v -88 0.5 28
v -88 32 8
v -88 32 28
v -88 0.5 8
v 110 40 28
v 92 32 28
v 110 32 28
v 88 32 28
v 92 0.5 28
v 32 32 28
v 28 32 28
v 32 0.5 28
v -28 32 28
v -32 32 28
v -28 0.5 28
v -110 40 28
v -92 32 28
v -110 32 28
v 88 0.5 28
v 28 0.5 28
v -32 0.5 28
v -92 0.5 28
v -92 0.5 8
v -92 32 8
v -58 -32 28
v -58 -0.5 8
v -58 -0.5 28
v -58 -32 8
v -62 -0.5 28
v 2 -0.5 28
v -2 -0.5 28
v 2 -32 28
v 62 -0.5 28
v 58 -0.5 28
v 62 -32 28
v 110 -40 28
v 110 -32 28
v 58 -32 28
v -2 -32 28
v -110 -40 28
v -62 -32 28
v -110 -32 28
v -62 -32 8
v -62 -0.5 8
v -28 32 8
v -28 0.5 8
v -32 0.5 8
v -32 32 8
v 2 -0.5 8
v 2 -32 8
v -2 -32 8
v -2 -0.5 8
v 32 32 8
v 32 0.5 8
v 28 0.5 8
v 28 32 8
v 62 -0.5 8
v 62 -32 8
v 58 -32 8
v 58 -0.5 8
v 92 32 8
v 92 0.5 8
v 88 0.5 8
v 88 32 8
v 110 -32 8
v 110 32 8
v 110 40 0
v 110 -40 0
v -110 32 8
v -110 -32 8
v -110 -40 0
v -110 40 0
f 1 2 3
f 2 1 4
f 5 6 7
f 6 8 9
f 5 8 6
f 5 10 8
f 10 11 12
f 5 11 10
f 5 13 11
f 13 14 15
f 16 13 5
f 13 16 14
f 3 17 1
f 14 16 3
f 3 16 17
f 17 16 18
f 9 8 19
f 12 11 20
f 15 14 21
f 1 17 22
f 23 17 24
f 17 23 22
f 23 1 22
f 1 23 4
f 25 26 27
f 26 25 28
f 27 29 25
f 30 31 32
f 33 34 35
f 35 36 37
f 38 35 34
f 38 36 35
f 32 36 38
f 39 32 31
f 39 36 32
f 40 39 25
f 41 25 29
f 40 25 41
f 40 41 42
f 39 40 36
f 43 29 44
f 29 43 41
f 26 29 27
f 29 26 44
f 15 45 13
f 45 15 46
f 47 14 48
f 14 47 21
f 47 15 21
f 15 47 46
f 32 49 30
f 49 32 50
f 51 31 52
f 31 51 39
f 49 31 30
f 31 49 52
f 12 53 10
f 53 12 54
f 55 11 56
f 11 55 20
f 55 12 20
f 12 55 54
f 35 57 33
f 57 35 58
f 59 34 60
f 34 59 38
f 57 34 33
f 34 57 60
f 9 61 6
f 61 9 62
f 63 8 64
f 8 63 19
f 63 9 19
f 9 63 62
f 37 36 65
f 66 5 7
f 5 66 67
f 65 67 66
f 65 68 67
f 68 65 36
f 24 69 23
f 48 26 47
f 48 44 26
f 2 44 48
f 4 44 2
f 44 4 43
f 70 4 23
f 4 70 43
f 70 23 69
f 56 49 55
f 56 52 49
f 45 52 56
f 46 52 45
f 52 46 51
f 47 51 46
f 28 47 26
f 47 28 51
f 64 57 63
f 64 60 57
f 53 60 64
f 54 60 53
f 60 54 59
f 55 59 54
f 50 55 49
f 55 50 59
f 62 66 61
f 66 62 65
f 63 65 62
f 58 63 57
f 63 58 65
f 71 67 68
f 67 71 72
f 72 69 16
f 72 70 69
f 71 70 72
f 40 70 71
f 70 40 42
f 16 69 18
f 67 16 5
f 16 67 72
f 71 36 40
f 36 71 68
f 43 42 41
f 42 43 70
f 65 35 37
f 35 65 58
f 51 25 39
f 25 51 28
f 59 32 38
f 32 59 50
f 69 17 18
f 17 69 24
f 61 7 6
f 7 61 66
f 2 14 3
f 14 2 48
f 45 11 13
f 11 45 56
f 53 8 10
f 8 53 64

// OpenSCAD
$fn = 32;

// ----------------------------------------------------------------------
// Rib frame 220 x 80 x 28
// 7 ribs at 30 mm pitch, staggered
// ----------------------------------------------------------------------

// --- parameters (mm) ---
frame = [220, 80, 8];  // base plate size (x, y, z)
rail_w = 8;            // side rail width
ribs = 7;              // number of ribs
rib_t = 4;             // rib thickness
rib_h = 20;            // rib height above the base plate
pitch = 30;            // pitch between rib centres

// --- derived feature positions (mm) ---
span = (ribs - 1) * pitch;          // = 180   distance between the outer ribs
origin_x = -span / 2;               // = -90   X of the first rib
rib_len = frame[1] / 2 - rail_w + 0.5;  // = 32.5   length of a staggered rib
rib_y = 0.5 + rib_len / 2;          // = 16.75   Y of a staggered rib centre
row_offset = 2 * rib_y;             // = 33.5   distance between the two rows
feature_centers = [
  [origin_x + 0 * pitch, rib_y],
  [origin_x + 1 * pitch, -rib_y],
  [origin_x + 2 * pitch, rib_y],
  [origin_x + 3 * pitch, -rib_y],
  [origin_x + 4 * pitch, rib_y],
  [origin_x + 5 * pitch, -rib_y],
  [origin_x + 6 * pitch, rib_y]
];   // rib centre line, drives the rib loop

// base plate, two side rails, then the ribs read straight off feature_centers
union() {
  translate([-frame[0] / 2, -frame[1] / 2, 0]) cube(frame);
  translate([-frame[0] / 2, -frame[1] / 2, 0]) cube([frame[0], rail_w, frame[2] + rib_h]);
  translate([-frame[0] / 2, frame[1] / 2 - rail_w, 0]) cube([frame[0], rail_w, frame[2] + rib_h]);
  for (centre = feature_centers)
    translate([centre[0] - rib_t / 2, centre[1] - rib_len / 2, frame[2] - 1])
      cube([rib_t, rib_len, rib_h + 1]);
}
